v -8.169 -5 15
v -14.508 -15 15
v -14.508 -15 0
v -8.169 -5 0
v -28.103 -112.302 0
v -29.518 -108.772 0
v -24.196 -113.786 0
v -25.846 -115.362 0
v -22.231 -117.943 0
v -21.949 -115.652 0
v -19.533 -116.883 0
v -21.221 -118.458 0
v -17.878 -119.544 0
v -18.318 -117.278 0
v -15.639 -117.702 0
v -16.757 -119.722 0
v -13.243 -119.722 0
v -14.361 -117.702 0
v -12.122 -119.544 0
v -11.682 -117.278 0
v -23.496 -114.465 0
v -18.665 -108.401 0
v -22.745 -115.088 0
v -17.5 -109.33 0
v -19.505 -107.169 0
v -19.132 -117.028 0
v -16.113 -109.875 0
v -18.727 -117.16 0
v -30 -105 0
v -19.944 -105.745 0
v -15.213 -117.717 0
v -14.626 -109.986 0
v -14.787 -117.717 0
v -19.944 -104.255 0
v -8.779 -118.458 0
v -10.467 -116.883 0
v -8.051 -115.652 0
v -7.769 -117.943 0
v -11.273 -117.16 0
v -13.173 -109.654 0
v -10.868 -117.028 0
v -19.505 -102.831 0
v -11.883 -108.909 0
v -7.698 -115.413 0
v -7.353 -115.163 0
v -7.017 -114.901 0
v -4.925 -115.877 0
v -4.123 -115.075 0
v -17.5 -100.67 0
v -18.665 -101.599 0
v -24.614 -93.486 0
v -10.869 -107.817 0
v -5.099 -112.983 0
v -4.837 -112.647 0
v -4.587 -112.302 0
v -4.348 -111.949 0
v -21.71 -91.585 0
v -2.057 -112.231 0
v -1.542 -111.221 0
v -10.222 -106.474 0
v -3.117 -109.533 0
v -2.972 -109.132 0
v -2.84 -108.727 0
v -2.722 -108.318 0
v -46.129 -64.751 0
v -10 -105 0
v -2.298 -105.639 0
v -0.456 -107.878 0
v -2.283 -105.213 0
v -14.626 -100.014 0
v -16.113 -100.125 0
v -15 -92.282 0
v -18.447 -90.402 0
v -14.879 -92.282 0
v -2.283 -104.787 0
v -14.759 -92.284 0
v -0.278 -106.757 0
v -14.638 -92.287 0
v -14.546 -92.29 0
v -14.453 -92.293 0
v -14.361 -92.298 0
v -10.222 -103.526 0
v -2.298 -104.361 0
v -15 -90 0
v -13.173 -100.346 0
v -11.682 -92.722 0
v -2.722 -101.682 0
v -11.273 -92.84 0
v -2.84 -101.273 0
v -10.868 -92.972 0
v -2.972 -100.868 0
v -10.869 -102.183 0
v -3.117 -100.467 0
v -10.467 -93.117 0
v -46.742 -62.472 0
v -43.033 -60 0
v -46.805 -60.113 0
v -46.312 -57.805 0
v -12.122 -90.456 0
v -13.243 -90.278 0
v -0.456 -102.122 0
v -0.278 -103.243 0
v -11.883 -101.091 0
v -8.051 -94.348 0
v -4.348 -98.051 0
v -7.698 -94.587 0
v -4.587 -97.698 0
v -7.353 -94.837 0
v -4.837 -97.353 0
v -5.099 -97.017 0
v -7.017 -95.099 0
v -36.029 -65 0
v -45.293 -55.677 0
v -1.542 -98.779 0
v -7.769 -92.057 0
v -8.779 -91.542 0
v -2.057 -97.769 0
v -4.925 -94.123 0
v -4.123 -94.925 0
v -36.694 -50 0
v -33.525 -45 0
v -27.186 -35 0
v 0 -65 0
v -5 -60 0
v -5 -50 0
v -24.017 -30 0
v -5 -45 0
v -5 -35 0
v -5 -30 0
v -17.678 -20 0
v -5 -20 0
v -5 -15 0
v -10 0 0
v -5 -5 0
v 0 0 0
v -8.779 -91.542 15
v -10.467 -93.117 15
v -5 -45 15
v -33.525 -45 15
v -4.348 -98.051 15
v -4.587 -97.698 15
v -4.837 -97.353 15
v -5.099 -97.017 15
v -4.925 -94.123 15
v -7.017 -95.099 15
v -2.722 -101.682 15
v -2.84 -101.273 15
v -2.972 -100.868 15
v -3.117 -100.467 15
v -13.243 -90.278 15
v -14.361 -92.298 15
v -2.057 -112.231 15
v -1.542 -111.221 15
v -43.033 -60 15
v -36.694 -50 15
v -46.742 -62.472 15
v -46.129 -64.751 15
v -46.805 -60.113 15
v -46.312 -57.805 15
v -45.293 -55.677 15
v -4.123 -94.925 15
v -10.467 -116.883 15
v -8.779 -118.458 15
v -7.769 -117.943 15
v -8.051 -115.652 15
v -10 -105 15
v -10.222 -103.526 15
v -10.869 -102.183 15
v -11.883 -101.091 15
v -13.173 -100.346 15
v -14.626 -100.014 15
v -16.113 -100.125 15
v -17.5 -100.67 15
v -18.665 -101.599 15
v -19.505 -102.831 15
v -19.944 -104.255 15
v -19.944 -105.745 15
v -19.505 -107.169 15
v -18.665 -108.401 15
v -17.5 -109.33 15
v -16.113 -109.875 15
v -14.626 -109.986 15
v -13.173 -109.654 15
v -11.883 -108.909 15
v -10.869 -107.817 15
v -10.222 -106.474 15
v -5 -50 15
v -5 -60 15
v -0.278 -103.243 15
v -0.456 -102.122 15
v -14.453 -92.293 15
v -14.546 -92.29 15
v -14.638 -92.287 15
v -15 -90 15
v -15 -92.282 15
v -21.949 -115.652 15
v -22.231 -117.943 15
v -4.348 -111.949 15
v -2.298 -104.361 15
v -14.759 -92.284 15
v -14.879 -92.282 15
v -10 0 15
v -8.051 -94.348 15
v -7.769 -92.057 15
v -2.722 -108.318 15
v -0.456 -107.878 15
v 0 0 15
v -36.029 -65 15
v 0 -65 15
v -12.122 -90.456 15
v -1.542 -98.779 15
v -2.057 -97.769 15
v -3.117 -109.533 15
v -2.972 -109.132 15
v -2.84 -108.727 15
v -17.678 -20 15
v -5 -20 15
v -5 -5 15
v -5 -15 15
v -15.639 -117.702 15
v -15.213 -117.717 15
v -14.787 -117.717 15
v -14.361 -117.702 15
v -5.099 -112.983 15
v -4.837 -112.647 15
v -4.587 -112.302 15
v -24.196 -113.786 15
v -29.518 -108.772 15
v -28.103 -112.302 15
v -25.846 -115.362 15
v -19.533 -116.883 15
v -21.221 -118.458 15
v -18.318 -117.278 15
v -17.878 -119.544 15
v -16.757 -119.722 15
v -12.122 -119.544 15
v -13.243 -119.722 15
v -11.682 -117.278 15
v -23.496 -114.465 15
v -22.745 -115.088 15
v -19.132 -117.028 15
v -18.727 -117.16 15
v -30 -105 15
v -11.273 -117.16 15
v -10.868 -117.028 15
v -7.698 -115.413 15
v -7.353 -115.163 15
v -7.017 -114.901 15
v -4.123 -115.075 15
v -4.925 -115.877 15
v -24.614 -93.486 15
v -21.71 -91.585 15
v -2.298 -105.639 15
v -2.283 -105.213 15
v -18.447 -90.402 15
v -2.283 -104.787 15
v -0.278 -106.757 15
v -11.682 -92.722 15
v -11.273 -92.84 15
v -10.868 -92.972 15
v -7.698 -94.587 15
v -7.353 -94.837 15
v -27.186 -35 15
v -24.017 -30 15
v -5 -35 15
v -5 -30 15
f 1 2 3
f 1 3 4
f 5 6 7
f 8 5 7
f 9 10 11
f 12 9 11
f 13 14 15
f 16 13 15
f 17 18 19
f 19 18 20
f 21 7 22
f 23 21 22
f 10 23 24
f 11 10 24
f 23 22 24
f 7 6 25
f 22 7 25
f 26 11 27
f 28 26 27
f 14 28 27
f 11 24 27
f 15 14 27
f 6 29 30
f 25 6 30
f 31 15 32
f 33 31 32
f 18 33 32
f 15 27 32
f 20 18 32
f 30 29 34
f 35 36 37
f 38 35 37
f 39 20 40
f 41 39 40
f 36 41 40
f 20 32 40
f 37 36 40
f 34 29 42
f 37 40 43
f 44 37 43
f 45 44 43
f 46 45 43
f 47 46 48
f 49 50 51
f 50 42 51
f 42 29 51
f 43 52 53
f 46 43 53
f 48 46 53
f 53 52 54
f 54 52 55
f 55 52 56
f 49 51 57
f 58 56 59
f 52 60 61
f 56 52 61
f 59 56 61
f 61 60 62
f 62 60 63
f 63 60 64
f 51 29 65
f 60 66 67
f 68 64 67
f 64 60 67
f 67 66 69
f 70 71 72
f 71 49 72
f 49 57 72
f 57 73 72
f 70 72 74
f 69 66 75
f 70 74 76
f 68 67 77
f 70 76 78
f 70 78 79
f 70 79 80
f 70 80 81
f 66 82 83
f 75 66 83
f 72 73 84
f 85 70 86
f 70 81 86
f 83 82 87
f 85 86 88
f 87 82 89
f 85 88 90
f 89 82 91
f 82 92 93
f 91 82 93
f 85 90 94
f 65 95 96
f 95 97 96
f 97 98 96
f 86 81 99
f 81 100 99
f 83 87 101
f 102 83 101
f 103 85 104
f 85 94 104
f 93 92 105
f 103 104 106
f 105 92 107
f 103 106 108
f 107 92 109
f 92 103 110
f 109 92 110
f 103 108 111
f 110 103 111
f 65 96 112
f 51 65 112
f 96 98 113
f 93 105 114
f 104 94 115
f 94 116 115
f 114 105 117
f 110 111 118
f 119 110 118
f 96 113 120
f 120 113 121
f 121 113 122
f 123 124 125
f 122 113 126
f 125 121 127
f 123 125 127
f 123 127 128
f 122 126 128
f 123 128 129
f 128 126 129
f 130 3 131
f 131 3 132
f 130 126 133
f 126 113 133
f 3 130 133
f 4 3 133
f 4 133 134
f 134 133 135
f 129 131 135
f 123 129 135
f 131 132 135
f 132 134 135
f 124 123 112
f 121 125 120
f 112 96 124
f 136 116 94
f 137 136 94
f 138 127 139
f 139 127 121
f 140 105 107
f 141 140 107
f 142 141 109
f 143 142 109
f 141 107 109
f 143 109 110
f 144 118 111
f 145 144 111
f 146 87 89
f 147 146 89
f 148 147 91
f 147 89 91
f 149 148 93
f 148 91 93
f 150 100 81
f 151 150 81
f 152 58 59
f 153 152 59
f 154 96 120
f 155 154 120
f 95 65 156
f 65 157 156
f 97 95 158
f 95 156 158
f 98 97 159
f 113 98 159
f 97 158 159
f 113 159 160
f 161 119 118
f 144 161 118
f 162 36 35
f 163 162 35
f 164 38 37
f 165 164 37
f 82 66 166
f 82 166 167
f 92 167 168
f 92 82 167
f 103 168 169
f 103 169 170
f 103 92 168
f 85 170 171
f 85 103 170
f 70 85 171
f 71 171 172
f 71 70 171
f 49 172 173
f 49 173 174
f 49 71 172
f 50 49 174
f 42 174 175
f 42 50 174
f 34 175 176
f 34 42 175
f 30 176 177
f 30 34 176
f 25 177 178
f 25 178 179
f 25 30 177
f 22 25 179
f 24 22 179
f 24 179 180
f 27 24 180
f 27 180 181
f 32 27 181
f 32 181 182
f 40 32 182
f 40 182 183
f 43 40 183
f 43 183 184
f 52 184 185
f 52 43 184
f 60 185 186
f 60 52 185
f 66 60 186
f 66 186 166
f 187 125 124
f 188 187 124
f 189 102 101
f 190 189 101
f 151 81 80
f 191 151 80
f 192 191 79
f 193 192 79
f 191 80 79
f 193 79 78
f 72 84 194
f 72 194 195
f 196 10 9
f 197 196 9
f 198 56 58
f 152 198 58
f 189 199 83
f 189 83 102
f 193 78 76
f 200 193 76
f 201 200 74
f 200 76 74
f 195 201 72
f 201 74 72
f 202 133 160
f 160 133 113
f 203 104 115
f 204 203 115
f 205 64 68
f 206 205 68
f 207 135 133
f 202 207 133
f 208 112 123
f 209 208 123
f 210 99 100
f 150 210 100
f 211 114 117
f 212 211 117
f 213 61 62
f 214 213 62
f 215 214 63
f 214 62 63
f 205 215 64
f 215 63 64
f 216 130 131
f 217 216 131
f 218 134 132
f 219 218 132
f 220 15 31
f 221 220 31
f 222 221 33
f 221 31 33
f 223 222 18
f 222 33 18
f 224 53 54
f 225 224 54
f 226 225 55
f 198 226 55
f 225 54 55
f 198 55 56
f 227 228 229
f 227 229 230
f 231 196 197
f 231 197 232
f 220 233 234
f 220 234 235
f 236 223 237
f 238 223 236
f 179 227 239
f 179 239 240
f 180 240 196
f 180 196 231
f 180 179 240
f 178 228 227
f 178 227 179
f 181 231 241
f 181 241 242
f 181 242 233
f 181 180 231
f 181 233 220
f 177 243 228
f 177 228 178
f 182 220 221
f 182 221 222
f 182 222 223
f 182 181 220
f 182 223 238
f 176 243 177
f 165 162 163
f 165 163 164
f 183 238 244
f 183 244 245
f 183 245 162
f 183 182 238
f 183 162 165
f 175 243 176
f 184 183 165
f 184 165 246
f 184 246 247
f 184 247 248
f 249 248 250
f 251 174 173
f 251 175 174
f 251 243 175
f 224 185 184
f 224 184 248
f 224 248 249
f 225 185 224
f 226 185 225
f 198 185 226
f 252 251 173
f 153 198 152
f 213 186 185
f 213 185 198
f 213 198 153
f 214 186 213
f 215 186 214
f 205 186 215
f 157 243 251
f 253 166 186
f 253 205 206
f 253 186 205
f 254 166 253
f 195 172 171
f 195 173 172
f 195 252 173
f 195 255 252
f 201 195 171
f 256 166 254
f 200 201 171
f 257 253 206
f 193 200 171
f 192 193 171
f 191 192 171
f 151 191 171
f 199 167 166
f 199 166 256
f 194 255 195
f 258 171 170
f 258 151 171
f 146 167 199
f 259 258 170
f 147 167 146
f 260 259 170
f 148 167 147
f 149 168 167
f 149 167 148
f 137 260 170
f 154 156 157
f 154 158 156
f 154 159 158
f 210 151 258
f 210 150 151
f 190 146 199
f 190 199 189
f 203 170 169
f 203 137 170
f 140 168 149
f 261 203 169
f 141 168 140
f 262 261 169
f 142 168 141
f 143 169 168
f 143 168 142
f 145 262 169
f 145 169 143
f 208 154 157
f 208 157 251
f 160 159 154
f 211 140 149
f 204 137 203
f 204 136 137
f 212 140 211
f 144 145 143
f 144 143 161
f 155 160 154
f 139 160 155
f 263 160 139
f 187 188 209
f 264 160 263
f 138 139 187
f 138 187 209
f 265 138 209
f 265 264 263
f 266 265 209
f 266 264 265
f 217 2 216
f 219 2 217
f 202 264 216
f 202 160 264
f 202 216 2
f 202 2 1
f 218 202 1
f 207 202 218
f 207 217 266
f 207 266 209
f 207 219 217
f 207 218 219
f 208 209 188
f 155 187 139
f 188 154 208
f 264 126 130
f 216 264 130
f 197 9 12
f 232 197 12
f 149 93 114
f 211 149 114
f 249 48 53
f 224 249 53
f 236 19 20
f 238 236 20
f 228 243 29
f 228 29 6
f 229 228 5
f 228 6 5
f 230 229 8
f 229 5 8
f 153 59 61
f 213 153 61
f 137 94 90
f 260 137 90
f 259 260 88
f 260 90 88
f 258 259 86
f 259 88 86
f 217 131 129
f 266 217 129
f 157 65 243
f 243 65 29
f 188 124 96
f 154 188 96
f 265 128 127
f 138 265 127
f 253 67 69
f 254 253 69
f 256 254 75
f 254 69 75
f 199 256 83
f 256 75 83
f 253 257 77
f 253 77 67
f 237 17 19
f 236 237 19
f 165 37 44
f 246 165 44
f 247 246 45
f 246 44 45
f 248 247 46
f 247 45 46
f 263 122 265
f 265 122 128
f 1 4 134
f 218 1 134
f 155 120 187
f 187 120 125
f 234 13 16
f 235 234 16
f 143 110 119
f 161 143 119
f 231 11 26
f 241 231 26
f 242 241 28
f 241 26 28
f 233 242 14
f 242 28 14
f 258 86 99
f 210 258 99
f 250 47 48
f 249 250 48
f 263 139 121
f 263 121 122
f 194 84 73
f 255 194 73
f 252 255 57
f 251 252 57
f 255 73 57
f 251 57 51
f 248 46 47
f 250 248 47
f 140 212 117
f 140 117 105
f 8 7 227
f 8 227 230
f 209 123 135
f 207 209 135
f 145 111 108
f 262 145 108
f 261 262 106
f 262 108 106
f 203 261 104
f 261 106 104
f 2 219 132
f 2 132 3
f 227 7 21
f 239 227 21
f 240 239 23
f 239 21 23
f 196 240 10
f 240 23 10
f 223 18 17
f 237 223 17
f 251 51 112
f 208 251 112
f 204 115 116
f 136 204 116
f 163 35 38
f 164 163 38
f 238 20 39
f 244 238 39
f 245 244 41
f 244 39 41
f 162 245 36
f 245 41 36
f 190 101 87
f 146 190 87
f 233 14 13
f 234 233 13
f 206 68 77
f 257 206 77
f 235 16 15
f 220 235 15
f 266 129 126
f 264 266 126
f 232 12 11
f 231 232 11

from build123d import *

# Parameters (mm, degrees)
SKETCH1_R           = 5
BOSS_EXTRUDE1_DEPTH = 15
CUT_EXTRUDE1_START  = -15
CUT_EXTRUDE1_DEPTH  = 15
BOSS_EXTRUDE2_START = -15
BOSS_EXTRUDE2_DEPTH = 15
FILLET1_R           = 10


with BuildPart() as part:
    # Sketch1 → Boss-Extrude1 (new body)
    with BuildSketch(Plane.XY):
        with BuildLine():
            Line((0, 0), (-10, 0))
            Line((-10, 0), (-48.033043506, -60))
            Line((-48.033043506, -60), (-30, -105))
            ThreePointArc((-30, -105), (-1.41305071, -111.355691072), (-24.614025467, -93.486073028))
            Line((-24.614025467, -93.486073028), (-36.029372005, -65))
            Line((-36.029372005, -65), (0, -65))
            Line((0, -65), (0, 0))
        make_face()
        Polygon((-5, -50), (-5, -60), (-43.033043506, -60), (-36.694202922, -50), align=None, mode=Mode.SUBTRACT)
        Polygon((-27.185942045, -35), (-5, -35), (-5, -45), (-33.52478263, -45), align=None, mode=Mode.SUBTRACT)
        Polygon((-17.677681169, -20), (-5, -20), (-5, -30), (-24.016521753, -30), align=None, mode=Mode.SUBTRACT)
        Polygon((-14.508260877, -15), (-8.169420292, -5), (-5, -5), (-5, -15), align=None, mode=Mode.SUBTRACT)
        with Locations((-15, -105)):
            Circle(SKETCH1_R, mode=Mode.SUBTRACT)
    extrude(amount=BOSS_EXTRUDE1_DEPTH)

    # Sketch2 → Cut-Extrude1 (cut)
    with BuildSketch(Plane.XY.offset(15).offset(CUT_EXTRUDE1_START)):
        with BuildLine():
            Line((-15, -90), (-15, -92.5))
            ThreePointArc((-15, -92.5), (-3.506810704, -109.914936399), (-24.038127106, -113.634944031))
            Line((-24.038127106, -113.634944031), (-25.845752528, -115.361932837))
            ThreePointArc((-25.845752528, -115.361932837), (-1.208172845, -110.897923679), (-15, -90))
        make_face()
    extrude(amount=CUT_EXTRUDE1_DEPTH, mode=Mode.SUBTRACT)

    # Sketch3 → Boss-Extrude2 (add)
    with BuildSketch(Plane.XY.offset(15).offset(BOSS_EXTRUDE2_START)):
        with BuildLine():
            ThreePointArc((-10.467166144, -93.116837157), (-11.06981717, -92.904141005), (-11.682391753, -92.721986422))
            Line((-11.682391753, -92.721986422), (-12.122200649, -90.45579864))
            Line((-12.122200649, -90.45579864), (-13.242544435, -90.278353616))
            Line((-13.242544435, -90.278353616), (-14.361118089, -92.29771785))
            ThreePointArc((-14.361118089, -92.29771785), (-14.499431062, -92.291515722), (-14.637803355, -92.286819615))
            ThreePointArc((-14.637803355, -92.286819615), (-14.818883312, -92.282950867), (-15, -92.281661197))
            Line((-15, -92.281661197), (-15, -92.5))
            ThreePointArc((-15, -92.5), (-3.506810704, -109.914936399), (-24.038127106, -113.634944031))
            Line((-24.038127106, -113.634944031), (-24.195997015, -113.785771498))
            ThreePointArc((-24.195997015, -113.785771498), (-23.126415999, -114.783532334), (-21.949347795, -115.651887492))
            Line((-21.949347795, -115.651887492), (-22.231355215, -117.943068572))
            Line((-22.231355215, -117.943068572), (-21.220678485, -118.458034088))
            Line((-21.220678485, -118.458034088), (-19.532833856, -116.883162843))
            ThreePointArc((-19.532833856, -116.883162843), (-18.93018283, -117.095858995), (-18.317608247, -117.278013578))
            Line((-18.317608247, -117.278013578), (-17.877799351, -119.54420136))
            Line((-17.877799351, -119.54420136), (-16.757455565, -119.721646384))
            Line((-16.757455565, -119.721646384), (-15.638881911, -117.70228215))
            ThreePointArc((-15.638881911, -117.70228215), (-15, -117.718338803), (-14.361118089, -117.70228215))
            Line((-14.361118089, -117.70228215), (-13.242544435, -119.721646384))
            Line((-13.242544435, -119.721646384), (-12.12220065, -119.544201361))
            Line((-12.12220065, -119.544201361), (-11.682391753, -117.278013578))
            ThreePointArc((-11.682391753, -117.278013578), (-11.06981717, -117.095858995), (-10.467166144, -116.883162843))
            Line((-10.467166144, -116.883162843), (-8.779321515, -118.458034088))
            Line((-8.779321515, -118.458034088), (-7.768644785, -117.943068573))
            Line((-7.768644785, -117.943068573), (-8.050652205, -115.651887492))
            ThreePointArc((-8.050652205, -115.651887492), (-7.524348018, -115.289352232), (-7.016919559, -114.900836762))
            Line((-7.016919559, -114.900836762), (-4.925021947, -115.877055647))
            Line((-4.925021947, -115.877055647), (-4.122944353, -115.074978053))
            Line((-4.122944353, -115.074978053), (-5.099163238, -112.983080441))
            ThreePointArc((-5.099163238, -112.983080441), (-4.710647768, -112.475651982), (-4.348112508, -111.949347795))
            Line((-4.348112508, -111.949347795), (-2.056931428, -112.231355215))
            Line((-2.056931428, -112.231355215), (-1.541965913, -111.220678485))
            Line((-1.541965913, -111.220678485), (-3.116837157, -109.532833856))
            ThreePointArc((-3.116837157, -109.532833856), (-2.904141005, -108.93018283), (-2.721986422, -108.317608247))
            Line((-2.721986422, -108.317608247), (-0.45579864, -107.877799351))
            Line((-0.45579864, -107.877799351), (-0.278353616, -106.757455565))
            Line((-0.278353616, -106.757455565), (-2.29771785, -105.638881911))
            ThreePointArc((-2.29771785, -105.638881911), (-2.281661197, -105), (-2.29771785, -104.361118089))
            Line((-2.29771785, -104.361118089), (-0.278353616, -103.242544435))
            Line((-0.278353616, -103.242544435), (-0.45579864, -102.122200649))
            Line((-0.45579864, -102.122200649), (-2.721986422, -101.682391753))
            ThreePointArc((-2.721986422, -101.682391753), (-2.904141005, -101.06981717), (-3.116837157, -100.467166144))
            Line((-3.116837157, -100.467166144), (-1.541965912, -98.779321515))
            Line((-1.541965912, -98.779321515), (-2.056931427, -97.768644785))
            Line((-2.056931427, -97.768644785), (-4.348112508, -98.050652205))
            ThreePointArc((-4.348112508, -98.050652205), (-4.710647768, -97.524348018), (-5.099163238, -97.016919559))
            Line((-5.099163238, -97.016919559), (-4.122944353, -94.925021947))
            Line((-4.122944353, -94.925021947), (-4.925021947, -94.122944353))
            Line((-4.925021947, -94.122944353), (-7.016919559, -95.099163238))
            ThreePointArc((-7.016919559, -95.099163238), (-7.524348018, -94.710647768), (-8.050652205, -94.348112508))
            Line((-8.050652205, -94.348112508), (-7.768644785, -92.056931428))
            Line((-7.768644785, -92.056931428), (-8.779321515, -91.541965912))
            Line((-8.779321515, -91.541965912), (-10.467166144, -93.116837157))
        make_face()
    extrude(amount=BOSS_EXTRUDE2_DEPTH)

    # Fillet1
    fillet1_edges = [part.edges().sort_by_distance(p)[0] for p in [
        (-48.033043506, -60, 7.5),
    ]]
    fillet(fillet1_edges, radius=FILLET1_R)


solid = part.part
